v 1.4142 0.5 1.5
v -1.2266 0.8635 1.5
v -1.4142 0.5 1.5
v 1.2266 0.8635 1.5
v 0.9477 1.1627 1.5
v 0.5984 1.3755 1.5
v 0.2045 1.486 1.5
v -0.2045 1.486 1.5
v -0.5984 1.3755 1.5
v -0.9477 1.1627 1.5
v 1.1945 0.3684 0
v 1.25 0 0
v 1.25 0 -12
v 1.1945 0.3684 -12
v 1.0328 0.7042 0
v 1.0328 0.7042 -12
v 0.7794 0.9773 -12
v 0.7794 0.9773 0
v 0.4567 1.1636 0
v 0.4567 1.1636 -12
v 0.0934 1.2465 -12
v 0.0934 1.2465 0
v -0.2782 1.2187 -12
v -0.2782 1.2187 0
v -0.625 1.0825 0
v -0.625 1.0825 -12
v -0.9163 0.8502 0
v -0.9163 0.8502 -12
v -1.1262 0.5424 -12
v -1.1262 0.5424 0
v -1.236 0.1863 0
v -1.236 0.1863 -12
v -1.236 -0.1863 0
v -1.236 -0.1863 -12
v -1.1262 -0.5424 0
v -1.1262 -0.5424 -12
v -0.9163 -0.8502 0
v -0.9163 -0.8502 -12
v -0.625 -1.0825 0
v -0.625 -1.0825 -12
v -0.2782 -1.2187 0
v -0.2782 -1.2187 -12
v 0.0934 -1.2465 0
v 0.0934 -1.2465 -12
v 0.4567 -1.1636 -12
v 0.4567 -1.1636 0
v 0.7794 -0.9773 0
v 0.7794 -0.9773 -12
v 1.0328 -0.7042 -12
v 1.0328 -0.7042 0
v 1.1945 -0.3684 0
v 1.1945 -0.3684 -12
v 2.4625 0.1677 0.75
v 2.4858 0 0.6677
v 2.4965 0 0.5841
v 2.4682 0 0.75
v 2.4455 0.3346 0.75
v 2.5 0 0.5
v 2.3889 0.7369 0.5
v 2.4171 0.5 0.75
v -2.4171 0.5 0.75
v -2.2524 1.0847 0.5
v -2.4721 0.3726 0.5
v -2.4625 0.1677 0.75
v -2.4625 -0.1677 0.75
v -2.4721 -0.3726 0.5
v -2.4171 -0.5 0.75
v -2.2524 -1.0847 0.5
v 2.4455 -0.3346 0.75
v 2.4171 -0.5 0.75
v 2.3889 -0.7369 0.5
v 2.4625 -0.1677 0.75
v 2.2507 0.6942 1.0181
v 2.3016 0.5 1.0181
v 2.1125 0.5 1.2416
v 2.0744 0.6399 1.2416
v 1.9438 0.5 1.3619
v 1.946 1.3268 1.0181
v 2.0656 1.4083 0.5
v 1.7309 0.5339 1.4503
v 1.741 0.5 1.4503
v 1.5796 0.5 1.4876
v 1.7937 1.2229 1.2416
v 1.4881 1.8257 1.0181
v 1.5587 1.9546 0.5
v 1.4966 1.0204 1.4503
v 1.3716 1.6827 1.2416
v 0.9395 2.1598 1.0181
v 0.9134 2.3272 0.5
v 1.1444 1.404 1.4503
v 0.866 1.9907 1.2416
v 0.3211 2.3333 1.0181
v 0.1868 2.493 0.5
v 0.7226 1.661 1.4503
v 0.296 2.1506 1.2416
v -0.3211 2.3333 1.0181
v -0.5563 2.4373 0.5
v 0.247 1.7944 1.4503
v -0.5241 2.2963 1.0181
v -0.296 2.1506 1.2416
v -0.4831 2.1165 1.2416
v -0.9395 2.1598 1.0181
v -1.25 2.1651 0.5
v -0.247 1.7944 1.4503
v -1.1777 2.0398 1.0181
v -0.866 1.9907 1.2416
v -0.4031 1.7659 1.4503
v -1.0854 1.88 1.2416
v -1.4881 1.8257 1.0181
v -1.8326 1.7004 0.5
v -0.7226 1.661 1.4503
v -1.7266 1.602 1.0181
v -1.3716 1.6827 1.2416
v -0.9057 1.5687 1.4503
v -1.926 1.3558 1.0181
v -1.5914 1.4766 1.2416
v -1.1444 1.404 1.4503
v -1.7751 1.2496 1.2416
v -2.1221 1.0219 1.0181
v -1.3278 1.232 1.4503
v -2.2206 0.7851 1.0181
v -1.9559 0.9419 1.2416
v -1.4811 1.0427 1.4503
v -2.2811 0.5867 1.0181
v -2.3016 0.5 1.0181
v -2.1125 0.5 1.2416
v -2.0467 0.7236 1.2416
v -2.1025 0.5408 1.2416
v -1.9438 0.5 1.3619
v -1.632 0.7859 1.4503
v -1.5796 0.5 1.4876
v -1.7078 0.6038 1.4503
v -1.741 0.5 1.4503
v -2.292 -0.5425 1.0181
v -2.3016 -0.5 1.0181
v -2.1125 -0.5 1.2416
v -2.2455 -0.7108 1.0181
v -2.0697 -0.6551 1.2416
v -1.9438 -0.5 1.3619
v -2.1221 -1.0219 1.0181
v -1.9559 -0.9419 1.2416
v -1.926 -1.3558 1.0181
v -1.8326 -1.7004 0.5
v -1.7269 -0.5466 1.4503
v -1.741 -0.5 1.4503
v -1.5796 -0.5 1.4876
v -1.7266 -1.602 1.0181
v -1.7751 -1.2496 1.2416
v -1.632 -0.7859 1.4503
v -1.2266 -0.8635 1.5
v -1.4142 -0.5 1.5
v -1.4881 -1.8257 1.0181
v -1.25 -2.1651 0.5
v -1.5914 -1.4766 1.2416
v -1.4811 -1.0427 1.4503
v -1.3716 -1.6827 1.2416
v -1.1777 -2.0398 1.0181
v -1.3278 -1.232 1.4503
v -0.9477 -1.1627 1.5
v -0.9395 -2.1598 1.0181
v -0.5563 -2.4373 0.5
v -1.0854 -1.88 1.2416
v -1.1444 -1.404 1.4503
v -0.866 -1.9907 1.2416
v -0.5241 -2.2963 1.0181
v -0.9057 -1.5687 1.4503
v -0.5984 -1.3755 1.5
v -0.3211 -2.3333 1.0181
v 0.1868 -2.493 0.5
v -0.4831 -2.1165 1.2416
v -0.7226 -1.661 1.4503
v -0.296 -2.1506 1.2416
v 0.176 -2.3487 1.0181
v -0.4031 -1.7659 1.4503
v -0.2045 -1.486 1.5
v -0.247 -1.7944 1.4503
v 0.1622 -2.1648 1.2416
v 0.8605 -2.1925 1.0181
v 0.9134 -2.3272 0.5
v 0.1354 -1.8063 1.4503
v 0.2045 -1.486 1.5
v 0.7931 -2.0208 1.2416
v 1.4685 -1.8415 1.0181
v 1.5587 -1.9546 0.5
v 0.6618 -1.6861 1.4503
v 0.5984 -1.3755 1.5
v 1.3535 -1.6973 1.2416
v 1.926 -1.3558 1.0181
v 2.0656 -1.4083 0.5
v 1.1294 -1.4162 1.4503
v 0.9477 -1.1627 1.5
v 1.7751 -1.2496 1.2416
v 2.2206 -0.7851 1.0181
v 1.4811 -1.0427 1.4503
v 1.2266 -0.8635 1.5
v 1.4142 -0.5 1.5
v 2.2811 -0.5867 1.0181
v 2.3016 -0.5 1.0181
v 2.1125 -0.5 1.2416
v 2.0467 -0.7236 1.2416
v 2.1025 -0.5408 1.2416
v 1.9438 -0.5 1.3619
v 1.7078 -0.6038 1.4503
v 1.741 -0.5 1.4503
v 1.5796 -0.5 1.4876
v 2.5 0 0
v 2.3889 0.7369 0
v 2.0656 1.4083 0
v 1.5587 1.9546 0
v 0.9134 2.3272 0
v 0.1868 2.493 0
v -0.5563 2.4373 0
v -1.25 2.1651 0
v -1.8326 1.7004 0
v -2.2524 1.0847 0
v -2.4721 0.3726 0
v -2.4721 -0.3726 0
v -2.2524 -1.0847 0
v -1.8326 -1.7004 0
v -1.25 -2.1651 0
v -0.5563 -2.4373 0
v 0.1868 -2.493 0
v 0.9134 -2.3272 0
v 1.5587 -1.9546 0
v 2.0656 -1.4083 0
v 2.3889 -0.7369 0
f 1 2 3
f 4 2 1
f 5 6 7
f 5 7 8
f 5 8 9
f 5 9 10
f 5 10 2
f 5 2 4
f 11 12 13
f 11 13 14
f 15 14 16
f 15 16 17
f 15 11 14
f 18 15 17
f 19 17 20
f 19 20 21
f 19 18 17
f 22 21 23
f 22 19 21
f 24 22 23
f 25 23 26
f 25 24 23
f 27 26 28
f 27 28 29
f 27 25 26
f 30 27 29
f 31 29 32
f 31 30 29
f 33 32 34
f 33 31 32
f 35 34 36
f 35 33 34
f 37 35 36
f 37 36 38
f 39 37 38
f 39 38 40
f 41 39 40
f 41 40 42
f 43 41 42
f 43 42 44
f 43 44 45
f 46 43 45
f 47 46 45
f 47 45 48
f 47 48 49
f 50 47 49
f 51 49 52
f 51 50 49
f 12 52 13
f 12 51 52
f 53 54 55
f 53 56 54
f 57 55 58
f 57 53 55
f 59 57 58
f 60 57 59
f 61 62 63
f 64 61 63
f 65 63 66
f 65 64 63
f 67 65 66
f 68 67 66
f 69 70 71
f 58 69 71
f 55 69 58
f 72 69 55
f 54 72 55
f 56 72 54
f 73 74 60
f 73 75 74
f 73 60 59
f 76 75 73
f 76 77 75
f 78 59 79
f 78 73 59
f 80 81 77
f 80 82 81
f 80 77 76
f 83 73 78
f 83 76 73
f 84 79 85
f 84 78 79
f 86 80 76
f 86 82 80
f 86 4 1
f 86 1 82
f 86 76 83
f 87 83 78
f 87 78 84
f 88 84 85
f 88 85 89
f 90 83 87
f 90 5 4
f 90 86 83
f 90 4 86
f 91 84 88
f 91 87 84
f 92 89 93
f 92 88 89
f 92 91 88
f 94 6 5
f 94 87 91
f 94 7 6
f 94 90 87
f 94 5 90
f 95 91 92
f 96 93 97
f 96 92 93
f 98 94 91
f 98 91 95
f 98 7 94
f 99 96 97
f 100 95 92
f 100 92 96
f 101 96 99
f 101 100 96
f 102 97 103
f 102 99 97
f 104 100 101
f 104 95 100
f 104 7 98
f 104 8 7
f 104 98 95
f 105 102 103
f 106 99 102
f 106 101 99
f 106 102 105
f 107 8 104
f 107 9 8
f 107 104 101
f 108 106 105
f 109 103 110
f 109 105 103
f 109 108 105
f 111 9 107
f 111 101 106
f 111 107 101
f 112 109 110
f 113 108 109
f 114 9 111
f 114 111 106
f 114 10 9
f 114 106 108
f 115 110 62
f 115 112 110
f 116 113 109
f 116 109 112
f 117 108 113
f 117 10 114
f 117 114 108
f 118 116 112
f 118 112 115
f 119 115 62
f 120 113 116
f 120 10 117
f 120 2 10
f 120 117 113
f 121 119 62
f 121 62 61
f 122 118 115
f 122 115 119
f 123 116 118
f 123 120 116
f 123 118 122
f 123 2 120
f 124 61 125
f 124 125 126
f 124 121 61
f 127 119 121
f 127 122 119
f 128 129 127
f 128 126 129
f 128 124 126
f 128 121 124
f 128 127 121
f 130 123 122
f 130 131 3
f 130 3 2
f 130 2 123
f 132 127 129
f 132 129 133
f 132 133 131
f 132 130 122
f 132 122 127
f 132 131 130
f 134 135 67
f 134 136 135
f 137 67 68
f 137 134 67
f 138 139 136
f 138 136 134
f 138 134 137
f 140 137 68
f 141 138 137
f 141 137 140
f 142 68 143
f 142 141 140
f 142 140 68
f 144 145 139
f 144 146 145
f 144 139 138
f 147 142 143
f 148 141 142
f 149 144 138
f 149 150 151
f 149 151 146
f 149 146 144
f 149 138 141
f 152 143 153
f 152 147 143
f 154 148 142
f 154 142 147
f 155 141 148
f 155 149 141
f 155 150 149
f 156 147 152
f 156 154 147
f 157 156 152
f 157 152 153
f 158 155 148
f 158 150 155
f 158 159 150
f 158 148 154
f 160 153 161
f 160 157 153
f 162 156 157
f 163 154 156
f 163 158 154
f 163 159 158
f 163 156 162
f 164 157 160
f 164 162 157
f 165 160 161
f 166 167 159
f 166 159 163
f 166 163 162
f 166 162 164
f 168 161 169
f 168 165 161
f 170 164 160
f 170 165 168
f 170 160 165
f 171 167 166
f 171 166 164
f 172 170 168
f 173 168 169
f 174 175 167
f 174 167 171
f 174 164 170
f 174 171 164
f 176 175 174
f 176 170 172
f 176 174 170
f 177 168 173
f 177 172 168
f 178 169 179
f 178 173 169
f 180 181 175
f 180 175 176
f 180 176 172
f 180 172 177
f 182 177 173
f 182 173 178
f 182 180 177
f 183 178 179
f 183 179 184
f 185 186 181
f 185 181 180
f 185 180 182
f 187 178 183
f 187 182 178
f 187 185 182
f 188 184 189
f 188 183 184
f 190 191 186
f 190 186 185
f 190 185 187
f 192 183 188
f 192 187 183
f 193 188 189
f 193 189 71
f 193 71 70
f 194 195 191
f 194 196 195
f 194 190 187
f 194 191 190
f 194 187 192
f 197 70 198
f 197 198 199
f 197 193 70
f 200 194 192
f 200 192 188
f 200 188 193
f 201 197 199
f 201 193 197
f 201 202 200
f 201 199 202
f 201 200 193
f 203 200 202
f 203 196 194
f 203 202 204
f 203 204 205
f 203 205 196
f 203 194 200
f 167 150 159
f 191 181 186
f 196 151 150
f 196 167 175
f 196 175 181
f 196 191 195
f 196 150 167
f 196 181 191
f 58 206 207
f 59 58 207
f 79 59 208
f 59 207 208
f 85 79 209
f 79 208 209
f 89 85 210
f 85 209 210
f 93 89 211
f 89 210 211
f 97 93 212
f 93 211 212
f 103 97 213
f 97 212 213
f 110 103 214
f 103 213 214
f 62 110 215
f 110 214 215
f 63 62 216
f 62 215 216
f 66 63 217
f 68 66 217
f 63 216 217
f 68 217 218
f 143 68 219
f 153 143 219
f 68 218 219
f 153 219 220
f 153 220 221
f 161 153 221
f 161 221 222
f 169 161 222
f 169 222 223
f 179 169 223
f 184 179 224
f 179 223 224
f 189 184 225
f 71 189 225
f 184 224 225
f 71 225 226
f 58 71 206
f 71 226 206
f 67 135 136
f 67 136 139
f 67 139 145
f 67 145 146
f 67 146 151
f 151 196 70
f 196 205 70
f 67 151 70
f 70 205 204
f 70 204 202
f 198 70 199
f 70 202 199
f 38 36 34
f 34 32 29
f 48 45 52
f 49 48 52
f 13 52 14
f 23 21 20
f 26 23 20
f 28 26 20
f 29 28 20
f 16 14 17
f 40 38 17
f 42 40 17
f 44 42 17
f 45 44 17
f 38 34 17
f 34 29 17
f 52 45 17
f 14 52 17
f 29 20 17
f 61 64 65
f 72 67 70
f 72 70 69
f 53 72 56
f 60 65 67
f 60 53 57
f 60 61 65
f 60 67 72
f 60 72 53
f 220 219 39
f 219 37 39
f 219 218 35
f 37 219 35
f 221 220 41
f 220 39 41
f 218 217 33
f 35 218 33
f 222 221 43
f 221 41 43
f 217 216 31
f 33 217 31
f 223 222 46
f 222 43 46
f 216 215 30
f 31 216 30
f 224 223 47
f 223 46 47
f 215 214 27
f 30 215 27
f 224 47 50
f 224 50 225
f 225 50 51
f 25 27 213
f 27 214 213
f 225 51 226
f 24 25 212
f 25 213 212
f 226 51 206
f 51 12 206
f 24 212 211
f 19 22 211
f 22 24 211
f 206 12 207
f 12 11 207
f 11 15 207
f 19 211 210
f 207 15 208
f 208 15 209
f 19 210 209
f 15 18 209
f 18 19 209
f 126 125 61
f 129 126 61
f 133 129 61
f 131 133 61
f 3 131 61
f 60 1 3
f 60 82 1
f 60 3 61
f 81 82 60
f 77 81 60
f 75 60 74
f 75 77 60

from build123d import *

# Parameters (mm, degrees)
SKETCH2_R           = 1.25
BOSS_EXTRUDE1_DEPTH = 12
SKETCH3_R           = 2.5
BOSS_EXTRUDE2_DEPTH = 1.5
FILLET1_R           = 1
SKETCH4_W           = 6.108207577
SKETCH4_H           = 1
CUT_EXTRUDE1_DEPTH  = 0.75


with BuildPart() as part:
    # Sketch2 → Boss-Extrude1 (new body)
    with BuildSketch(Plane.XY):
        Circle(SKETCH2_R)
    extrude(amount=-BOSS_EXTRUDE1_DEPTH)

    # Sketch3 → Boss-Extrude2 (add)
    with BuildSketch(Plane.XY):
        Circle(SKETCH3_R)
    extrude(amount=BOSS_EXTRUDE2_DEPTH)

    # Fillet1
    fillet1_edges = [part.edges().sort_by_distance(p)[0] for p in [
        (-2.5, 0, 1.5),
    ]]
    fillet(fillet1_edges, radius=FILLET1_R)

    # Sketch4 → Cut-Extrude1 (cut)
    with BuildSketch(Plane.XY.offset(1.5)):
        with Locations((-0.048809877, 0)):
            Rectangle(SKETCH4_W, SKETCH4_H)
    extrude(amount=-CUT_EXTRUDE1_DEPTH, mode=Mode.SUBTRACT)


solid = part.part
